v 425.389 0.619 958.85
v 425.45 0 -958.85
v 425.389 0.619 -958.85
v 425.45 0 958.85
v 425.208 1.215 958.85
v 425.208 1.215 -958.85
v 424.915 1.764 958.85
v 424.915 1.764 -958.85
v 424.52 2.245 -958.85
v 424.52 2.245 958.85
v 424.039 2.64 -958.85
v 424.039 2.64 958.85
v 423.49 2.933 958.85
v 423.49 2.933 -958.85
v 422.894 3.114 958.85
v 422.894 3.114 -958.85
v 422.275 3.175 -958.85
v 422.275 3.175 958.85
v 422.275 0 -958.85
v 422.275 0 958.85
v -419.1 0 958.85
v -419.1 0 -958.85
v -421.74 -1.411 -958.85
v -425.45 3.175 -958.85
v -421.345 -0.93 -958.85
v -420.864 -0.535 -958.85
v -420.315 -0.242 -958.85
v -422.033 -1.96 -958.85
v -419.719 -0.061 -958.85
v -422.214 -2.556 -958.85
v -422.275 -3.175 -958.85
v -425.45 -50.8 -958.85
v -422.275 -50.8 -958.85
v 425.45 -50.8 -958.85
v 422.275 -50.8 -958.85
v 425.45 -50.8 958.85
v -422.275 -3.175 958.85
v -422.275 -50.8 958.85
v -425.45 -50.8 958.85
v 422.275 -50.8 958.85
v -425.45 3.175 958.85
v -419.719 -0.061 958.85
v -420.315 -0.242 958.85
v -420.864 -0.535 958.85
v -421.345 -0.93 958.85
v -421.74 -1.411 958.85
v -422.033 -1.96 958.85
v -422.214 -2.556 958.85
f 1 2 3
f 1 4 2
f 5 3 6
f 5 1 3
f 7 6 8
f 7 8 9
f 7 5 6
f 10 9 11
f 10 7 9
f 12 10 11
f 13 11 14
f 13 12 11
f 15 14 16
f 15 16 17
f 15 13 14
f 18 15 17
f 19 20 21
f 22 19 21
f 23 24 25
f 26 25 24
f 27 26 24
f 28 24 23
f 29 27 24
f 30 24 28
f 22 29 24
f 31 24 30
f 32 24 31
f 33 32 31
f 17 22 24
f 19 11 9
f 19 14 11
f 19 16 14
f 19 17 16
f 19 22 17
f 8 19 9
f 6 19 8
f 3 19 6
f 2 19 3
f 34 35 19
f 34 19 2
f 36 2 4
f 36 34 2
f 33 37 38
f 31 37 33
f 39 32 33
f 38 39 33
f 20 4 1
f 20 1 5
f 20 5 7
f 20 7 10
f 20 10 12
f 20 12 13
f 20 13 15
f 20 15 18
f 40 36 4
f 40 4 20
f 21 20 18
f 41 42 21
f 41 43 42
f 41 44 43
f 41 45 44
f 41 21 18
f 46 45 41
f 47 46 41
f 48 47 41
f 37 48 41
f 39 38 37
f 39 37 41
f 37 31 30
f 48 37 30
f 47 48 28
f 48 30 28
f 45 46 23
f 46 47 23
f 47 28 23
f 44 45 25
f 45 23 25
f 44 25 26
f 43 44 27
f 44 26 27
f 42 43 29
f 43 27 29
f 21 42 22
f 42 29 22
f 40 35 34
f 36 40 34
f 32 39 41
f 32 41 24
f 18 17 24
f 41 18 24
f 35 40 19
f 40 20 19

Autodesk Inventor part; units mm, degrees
ref_plane "YZ Plane" through (0, 0, 0) normal (1, 0, 0) x (0, 1, 0)
ref_plane "XZ Plane" through (0, 0, 0) normal (0, 1, 0) x (-1, 0, 0)
ref_plane "XY Plane" through (0, 0, 0) normal (0, 0, 1) x (1, 0, 0)
sketch "Sketch1" plane through (0, 0, 0) normal (0, 1, 0) x (-1, 0, 0)
  line L0 (-425.45, 958.85) -> (425.45, 958.85)
  line L1 (425.45, 958.85) -> (425.45, -958.85)
  line L2 (425.45, -958.85) -> (-425.45, -958.85)
  line L3 (-425.45, -958.85) -> (-425.45, 958.85)
  line L4 (-425.45, 958.85) -> (425.45, -958.85) construction
  line L5 (425.45, 958.85) -> (-425.45, -958.85) construction
  point P0 (0, 0)
  dimension "d0" = 850.9
  dimension "d1" = 1917.7
extrude "Extrusion1" add sketch "Sketch1" along normal blind 3.175
sketch "Sketch2" plane through (0, 0, 0) normal (0, -1, 0) x (1, 0, 0)
  line L0 (425.45, -958.85) -> (-425.45, -958.85) projected
  line L1 (425.45, 958.85) -> (425.45, -958.85) projected
  line L2 (-425.45, 958.85) -> (425.45, 958.85) projected
  line L3 (-425.45, -958.85) -> (-425.45, 958.85) projected
  line L4 (-425.45, 958.85) -> (425.45, 958.85) projected
  line L5 (425.45, -958.85) -> (-425.45, -958.85) projected
  line L6 (425.45, 958.85) -> (422.275, 958.85)
  line L7 (422.275, 958.85) -> (422.275, -958.85)
  line L8 (422.275, -958.85) -> (425.45, -958.85)
  line L9 (425.45, -958.85) -> (425.45, 958.85)
  line L10 (-425.45, -958.85) -> (-425.45, 958.85) projected
  line L11 (-425.45, 958.85) -> (-422.275, 958.85)
  line L12 (-422.275, 958.85) -> (-422.275, -958.85)
  line L13 (-422.275, -958.85) -> (-425.45, -958.85)
  line L14 (-425.45, -958.85) -> (-425.45, 958.85)
  point P0 (0, 0)
  point P1 (-422.275, 958.85)
  point P2 (422.275, -958.85)
  dimension "d4" = 3.175
  dimension "d5" = 3.175
extrude "Extrusion2" add sketch "Sketch2" along normal blind 50.8 contours L0 L7 L2 L1 | L0 L3 L2 L12
fillet "Fillet1" radius 3.175 2 edges at (-422.275, 0, 0) (425.45, 3.175, 0)
properties part number "IronFrame" material "Iron, Cast"
